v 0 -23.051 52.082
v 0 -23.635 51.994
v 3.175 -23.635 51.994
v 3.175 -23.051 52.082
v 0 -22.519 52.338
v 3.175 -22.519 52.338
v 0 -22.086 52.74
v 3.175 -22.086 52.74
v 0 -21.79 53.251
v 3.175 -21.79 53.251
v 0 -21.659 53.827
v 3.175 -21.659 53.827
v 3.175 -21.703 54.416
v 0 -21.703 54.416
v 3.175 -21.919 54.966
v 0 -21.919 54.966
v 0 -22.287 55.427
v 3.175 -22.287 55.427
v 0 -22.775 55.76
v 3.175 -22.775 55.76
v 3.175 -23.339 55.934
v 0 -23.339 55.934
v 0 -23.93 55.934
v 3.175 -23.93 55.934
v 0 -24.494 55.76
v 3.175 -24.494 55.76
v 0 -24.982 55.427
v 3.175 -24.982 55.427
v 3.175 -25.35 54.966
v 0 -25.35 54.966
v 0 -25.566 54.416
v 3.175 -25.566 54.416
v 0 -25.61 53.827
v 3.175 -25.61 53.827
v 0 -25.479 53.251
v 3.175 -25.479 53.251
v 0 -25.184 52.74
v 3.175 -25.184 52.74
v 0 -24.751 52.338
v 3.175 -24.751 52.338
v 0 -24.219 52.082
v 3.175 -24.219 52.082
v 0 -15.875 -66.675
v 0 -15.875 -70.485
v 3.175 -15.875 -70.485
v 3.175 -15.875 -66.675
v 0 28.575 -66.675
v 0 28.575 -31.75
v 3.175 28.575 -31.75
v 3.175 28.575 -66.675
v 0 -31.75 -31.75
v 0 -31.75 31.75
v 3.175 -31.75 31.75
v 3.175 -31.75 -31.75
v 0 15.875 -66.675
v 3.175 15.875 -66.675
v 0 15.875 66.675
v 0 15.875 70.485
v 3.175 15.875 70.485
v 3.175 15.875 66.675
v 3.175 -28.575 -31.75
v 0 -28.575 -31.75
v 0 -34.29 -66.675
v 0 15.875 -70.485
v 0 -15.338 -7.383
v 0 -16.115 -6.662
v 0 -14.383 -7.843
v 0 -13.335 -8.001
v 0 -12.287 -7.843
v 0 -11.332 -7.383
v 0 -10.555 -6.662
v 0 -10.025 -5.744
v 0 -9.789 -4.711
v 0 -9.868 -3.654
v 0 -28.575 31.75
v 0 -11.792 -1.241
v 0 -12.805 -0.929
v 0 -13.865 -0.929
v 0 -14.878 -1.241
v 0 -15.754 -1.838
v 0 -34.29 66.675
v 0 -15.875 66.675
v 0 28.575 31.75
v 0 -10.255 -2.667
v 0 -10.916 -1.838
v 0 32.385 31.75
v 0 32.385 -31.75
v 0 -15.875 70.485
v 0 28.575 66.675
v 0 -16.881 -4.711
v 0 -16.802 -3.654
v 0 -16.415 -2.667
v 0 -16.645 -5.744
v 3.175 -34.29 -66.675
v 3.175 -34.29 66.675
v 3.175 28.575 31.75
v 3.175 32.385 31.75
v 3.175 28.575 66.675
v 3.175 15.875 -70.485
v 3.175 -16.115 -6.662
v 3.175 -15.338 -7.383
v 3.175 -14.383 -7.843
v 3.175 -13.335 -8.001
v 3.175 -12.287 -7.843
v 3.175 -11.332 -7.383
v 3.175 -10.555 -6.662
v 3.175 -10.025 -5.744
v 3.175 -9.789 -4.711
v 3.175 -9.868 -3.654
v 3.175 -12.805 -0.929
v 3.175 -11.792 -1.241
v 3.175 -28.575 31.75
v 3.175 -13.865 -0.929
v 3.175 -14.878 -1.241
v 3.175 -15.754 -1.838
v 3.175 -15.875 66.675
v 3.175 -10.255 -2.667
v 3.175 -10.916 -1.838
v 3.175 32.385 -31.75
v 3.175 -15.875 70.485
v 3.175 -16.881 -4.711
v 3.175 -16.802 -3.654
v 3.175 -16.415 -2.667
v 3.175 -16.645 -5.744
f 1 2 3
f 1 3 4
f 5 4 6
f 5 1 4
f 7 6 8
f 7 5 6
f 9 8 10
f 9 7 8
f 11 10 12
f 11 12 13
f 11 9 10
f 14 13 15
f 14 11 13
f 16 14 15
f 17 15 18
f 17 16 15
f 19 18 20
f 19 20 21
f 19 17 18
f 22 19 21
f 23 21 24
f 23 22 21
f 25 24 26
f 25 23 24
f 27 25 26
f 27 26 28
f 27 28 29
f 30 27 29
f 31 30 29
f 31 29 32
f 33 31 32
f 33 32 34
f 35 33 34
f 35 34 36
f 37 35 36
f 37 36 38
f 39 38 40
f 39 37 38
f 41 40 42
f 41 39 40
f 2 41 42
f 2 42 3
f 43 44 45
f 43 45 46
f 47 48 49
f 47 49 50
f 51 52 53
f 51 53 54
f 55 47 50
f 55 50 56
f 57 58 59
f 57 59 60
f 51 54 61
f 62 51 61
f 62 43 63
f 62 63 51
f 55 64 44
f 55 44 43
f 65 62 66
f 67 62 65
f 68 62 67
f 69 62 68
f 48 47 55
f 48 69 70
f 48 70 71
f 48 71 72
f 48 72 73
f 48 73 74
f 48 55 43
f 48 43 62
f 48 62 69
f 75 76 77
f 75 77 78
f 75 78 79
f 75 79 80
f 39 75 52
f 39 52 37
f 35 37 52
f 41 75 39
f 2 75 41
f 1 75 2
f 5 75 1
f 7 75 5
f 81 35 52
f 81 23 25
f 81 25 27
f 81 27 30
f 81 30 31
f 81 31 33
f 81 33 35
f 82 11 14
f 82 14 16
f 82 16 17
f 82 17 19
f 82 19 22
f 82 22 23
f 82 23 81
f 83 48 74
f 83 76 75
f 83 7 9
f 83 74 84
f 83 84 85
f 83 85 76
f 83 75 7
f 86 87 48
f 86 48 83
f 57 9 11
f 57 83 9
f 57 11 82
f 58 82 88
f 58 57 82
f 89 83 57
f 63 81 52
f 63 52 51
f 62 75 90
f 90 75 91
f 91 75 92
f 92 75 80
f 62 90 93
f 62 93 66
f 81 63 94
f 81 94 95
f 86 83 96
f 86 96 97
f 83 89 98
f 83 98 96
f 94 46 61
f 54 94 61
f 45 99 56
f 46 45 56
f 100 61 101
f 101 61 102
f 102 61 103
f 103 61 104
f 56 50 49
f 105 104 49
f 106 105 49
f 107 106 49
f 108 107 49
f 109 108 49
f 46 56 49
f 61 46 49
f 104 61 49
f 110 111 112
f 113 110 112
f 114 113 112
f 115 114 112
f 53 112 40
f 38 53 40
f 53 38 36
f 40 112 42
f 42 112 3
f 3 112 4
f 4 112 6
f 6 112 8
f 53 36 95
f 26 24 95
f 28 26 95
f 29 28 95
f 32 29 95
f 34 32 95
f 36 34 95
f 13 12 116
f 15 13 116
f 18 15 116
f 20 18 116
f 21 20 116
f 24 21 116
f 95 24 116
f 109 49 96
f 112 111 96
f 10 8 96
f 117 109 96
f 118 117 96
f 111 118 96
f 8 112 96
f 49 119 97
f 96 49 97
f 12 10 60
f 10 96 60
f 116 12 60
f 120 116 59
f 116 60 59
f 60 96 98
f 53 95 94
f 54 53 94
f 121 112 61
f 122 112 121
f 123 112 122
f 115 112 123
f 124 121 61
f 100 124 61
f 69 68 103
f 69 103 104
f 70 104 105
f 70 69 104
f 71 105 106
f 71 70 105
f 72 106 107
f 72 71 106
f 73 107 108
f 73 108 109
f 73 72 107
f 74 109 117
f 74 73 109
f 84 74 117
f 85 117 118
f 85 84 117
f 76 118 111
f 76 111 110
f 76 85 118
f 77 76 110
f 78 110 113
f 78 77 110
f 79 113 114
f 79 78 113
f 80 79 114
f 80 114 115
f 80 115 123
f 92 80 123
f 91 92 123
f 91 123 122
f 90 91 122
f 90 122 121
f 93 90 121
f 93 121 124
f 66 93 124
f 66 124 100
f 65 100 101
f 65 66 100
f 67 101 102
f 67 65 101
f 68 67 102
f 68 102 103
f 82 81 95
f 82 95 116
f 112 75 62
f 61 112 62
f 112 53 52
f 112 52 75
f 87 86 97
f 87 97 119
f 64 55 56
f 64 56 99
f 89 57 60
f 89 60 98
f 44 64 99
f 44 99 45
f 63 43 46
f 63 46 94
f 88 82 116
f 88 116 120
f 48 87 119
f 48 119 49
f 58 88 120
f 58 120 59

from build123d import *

# Parameters (mm, degrees)
SKETCH1_R           = 3.556
SKETCH1_R_2         = 1.9812
SKETCH1_W           = 63.5
SKETCH1_H           = 3.175
BOSS_EXTRUDE1_DEPTH = 3.175


with BuildPart() as part:
    # Sketch1 → Boss-Extrude1 (new body)
    with BuildSketch(Plane(origin=(0, 0, 0), x_dir=(0, 0, -1), z_dir=(1, 0, 0))):
        Polygon((-66.675, 28.575), (-31.75, 28.575), (-31.75, 32.385), (31.75, 32.385), (31.75, 28.575), (66.675, 28.575), (66.675, 15.875), (70.485, 15.875), (70.485, -15.875), (66.675, -15.875), (66.675, -34.29), (-66.675, -34.29), (-66.675, -15.875), (-70.485, -15.875), (-70.485, 15.875), (-66.675, 15.875), align=None)
        with Locations((4.445, -13.335)):
            Circle(SKETCH1_R, mode=Mode.SUBTRACT)
        with Locations((-53.975, -23.6347)):
            Circle(SKETCH1_R_2, mode=Mode.SUBTRACT)
        with Locations((0, -30.1625)):
            Rectangle(SKETCH1_W, SKETCH1_H, mode=Mode.SUBTRACT)
    extrude(amount=BOSS_EXTRUDE1_DEPTH)


solid = part.part
